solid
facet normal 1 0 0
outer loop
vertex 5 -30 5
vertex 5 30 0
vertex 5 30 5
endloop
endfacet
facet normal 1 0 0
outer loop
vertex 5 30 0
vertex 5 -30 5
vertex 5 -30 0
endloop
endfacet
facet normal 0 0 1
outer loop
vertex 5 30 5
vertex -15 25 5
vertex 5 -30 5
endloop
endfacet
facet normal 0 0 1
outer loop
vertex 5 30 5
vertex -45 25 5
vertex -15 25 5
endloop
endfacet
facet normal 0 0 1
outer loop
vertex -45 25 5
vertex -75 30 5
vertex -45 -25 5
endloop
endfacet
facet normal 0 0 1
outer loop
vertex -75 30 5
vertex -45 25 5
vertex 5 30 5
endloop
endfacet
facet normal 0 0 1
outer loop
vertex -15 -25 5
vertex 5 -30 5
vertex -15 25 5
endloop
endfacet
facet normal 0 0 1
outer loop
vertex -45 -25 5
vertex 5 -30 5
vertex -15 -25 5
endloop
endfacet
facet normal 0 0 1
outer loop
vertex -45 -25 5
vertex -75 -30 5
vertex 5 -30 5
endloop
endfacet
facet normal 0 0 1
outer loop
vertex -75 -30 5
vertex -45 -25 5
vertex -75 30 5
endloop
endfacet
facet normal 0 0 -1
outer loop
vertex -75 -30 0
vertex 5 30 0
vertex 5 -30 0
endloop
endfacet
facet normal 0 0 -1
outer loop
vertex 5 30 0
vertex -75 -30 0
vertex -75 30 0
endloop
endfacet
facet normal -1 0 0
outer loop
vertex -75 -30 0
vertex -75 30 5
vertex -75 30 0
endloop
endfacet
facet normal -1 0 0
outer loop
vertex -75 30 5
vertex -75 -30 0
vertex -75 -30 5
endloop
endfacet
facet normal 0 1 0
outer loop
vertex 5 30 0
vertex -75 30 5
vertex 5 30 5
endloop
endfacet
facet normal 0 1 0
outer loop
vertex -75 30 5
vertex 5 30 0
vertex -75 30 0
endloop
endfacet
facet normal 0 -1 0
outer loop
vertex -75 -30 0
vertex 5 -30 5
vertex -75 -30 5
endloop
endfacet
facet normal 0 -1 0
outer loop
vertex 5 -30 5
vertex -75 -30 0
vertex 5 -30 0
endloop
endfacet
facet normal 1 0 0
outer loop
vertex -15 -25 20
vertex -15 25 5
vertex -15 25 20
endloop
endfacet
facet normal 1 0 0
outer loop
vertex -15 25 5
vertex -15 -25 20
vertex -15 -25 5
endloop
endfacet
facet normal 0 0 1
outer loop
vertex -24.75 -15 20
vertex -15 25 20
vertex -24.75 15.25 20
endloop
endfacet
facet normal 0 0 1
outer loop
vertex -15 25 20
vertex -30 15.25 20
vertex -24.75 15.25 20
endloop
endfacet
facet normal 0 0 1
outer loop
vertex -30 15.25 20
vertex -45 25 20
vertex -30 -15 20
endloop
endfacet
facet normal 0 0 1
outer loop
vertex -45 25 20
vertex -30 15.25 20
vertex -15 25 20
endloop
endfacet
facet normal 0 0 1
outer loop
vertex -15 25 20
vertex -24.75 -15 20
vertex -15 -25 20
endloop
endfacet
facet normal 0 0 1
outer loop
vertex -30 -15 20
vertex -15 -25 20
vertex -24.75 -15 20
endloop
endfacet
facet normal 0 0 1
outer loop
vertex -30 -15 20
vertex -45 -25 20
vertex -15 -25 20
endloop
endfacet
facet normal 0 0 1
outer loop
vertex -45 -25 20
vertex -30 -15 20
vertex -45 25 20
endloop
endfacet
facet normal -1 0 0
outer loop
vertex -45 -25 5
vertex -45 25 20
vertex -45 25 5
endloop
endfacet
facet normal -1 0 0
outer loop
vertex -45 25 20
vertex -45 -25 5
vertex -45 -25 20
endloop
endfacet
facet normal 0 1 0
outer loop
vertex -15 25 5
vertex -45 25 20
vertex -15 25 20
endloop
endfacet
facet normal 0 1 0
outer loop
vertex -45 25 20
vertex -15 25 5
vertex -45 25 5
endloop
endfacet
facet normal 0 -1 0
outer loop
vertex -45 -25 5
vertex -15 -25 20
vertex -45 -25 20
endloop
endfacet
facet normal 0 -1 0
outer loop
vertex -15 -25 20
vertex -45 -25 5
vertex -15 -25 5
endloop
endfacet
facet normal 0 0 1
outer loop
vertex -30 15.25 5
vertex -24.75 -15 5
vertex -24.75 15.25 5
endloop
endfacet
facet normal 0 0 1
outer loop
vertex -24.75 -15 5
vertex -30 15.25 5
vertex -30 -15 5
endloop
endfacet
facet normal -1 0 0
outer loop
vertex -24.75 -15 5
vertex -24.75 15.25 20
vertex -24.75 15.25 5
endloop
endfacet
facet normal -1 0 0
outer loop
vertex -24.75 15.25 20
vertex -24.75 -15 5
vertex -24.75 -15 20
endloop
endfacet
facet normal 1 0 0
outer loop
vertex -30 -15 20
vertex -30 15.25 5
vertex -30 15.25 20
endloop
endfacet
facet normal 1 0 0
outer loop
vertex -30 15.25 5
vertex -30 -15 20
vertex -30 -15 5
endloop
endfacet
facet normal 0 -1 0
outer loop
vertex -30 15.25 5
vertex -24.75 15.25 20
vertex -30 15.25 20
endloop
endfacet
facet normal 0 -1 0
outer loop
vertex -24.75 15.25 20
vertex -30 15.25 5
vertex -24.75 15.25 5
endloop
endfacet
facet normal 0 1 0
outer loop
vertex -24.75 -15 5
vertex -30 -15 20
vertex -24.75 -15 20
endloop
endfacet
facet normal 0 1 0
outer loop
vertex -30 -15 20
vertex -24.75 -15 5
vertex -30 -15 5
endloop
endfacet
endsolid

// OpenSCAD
$fn=100;
width=60;//dont change unless you change the width of the part that goes into this slot
length=80;
total_height=25;
hole_thickness=5.25;//dont change these if your using my other design part unless you change the other part the same
difference()
{
union()

{

translate([-75,-30,0])cube([length,width,total_height/5]);
translate([-45,-25,0])cube([length-50,width-10,total_height/1.25]);
}

rotate([0,90,0])translate([-105,-15,-30])cube([total_height*4,width/1.98347107,5.25]);
}
